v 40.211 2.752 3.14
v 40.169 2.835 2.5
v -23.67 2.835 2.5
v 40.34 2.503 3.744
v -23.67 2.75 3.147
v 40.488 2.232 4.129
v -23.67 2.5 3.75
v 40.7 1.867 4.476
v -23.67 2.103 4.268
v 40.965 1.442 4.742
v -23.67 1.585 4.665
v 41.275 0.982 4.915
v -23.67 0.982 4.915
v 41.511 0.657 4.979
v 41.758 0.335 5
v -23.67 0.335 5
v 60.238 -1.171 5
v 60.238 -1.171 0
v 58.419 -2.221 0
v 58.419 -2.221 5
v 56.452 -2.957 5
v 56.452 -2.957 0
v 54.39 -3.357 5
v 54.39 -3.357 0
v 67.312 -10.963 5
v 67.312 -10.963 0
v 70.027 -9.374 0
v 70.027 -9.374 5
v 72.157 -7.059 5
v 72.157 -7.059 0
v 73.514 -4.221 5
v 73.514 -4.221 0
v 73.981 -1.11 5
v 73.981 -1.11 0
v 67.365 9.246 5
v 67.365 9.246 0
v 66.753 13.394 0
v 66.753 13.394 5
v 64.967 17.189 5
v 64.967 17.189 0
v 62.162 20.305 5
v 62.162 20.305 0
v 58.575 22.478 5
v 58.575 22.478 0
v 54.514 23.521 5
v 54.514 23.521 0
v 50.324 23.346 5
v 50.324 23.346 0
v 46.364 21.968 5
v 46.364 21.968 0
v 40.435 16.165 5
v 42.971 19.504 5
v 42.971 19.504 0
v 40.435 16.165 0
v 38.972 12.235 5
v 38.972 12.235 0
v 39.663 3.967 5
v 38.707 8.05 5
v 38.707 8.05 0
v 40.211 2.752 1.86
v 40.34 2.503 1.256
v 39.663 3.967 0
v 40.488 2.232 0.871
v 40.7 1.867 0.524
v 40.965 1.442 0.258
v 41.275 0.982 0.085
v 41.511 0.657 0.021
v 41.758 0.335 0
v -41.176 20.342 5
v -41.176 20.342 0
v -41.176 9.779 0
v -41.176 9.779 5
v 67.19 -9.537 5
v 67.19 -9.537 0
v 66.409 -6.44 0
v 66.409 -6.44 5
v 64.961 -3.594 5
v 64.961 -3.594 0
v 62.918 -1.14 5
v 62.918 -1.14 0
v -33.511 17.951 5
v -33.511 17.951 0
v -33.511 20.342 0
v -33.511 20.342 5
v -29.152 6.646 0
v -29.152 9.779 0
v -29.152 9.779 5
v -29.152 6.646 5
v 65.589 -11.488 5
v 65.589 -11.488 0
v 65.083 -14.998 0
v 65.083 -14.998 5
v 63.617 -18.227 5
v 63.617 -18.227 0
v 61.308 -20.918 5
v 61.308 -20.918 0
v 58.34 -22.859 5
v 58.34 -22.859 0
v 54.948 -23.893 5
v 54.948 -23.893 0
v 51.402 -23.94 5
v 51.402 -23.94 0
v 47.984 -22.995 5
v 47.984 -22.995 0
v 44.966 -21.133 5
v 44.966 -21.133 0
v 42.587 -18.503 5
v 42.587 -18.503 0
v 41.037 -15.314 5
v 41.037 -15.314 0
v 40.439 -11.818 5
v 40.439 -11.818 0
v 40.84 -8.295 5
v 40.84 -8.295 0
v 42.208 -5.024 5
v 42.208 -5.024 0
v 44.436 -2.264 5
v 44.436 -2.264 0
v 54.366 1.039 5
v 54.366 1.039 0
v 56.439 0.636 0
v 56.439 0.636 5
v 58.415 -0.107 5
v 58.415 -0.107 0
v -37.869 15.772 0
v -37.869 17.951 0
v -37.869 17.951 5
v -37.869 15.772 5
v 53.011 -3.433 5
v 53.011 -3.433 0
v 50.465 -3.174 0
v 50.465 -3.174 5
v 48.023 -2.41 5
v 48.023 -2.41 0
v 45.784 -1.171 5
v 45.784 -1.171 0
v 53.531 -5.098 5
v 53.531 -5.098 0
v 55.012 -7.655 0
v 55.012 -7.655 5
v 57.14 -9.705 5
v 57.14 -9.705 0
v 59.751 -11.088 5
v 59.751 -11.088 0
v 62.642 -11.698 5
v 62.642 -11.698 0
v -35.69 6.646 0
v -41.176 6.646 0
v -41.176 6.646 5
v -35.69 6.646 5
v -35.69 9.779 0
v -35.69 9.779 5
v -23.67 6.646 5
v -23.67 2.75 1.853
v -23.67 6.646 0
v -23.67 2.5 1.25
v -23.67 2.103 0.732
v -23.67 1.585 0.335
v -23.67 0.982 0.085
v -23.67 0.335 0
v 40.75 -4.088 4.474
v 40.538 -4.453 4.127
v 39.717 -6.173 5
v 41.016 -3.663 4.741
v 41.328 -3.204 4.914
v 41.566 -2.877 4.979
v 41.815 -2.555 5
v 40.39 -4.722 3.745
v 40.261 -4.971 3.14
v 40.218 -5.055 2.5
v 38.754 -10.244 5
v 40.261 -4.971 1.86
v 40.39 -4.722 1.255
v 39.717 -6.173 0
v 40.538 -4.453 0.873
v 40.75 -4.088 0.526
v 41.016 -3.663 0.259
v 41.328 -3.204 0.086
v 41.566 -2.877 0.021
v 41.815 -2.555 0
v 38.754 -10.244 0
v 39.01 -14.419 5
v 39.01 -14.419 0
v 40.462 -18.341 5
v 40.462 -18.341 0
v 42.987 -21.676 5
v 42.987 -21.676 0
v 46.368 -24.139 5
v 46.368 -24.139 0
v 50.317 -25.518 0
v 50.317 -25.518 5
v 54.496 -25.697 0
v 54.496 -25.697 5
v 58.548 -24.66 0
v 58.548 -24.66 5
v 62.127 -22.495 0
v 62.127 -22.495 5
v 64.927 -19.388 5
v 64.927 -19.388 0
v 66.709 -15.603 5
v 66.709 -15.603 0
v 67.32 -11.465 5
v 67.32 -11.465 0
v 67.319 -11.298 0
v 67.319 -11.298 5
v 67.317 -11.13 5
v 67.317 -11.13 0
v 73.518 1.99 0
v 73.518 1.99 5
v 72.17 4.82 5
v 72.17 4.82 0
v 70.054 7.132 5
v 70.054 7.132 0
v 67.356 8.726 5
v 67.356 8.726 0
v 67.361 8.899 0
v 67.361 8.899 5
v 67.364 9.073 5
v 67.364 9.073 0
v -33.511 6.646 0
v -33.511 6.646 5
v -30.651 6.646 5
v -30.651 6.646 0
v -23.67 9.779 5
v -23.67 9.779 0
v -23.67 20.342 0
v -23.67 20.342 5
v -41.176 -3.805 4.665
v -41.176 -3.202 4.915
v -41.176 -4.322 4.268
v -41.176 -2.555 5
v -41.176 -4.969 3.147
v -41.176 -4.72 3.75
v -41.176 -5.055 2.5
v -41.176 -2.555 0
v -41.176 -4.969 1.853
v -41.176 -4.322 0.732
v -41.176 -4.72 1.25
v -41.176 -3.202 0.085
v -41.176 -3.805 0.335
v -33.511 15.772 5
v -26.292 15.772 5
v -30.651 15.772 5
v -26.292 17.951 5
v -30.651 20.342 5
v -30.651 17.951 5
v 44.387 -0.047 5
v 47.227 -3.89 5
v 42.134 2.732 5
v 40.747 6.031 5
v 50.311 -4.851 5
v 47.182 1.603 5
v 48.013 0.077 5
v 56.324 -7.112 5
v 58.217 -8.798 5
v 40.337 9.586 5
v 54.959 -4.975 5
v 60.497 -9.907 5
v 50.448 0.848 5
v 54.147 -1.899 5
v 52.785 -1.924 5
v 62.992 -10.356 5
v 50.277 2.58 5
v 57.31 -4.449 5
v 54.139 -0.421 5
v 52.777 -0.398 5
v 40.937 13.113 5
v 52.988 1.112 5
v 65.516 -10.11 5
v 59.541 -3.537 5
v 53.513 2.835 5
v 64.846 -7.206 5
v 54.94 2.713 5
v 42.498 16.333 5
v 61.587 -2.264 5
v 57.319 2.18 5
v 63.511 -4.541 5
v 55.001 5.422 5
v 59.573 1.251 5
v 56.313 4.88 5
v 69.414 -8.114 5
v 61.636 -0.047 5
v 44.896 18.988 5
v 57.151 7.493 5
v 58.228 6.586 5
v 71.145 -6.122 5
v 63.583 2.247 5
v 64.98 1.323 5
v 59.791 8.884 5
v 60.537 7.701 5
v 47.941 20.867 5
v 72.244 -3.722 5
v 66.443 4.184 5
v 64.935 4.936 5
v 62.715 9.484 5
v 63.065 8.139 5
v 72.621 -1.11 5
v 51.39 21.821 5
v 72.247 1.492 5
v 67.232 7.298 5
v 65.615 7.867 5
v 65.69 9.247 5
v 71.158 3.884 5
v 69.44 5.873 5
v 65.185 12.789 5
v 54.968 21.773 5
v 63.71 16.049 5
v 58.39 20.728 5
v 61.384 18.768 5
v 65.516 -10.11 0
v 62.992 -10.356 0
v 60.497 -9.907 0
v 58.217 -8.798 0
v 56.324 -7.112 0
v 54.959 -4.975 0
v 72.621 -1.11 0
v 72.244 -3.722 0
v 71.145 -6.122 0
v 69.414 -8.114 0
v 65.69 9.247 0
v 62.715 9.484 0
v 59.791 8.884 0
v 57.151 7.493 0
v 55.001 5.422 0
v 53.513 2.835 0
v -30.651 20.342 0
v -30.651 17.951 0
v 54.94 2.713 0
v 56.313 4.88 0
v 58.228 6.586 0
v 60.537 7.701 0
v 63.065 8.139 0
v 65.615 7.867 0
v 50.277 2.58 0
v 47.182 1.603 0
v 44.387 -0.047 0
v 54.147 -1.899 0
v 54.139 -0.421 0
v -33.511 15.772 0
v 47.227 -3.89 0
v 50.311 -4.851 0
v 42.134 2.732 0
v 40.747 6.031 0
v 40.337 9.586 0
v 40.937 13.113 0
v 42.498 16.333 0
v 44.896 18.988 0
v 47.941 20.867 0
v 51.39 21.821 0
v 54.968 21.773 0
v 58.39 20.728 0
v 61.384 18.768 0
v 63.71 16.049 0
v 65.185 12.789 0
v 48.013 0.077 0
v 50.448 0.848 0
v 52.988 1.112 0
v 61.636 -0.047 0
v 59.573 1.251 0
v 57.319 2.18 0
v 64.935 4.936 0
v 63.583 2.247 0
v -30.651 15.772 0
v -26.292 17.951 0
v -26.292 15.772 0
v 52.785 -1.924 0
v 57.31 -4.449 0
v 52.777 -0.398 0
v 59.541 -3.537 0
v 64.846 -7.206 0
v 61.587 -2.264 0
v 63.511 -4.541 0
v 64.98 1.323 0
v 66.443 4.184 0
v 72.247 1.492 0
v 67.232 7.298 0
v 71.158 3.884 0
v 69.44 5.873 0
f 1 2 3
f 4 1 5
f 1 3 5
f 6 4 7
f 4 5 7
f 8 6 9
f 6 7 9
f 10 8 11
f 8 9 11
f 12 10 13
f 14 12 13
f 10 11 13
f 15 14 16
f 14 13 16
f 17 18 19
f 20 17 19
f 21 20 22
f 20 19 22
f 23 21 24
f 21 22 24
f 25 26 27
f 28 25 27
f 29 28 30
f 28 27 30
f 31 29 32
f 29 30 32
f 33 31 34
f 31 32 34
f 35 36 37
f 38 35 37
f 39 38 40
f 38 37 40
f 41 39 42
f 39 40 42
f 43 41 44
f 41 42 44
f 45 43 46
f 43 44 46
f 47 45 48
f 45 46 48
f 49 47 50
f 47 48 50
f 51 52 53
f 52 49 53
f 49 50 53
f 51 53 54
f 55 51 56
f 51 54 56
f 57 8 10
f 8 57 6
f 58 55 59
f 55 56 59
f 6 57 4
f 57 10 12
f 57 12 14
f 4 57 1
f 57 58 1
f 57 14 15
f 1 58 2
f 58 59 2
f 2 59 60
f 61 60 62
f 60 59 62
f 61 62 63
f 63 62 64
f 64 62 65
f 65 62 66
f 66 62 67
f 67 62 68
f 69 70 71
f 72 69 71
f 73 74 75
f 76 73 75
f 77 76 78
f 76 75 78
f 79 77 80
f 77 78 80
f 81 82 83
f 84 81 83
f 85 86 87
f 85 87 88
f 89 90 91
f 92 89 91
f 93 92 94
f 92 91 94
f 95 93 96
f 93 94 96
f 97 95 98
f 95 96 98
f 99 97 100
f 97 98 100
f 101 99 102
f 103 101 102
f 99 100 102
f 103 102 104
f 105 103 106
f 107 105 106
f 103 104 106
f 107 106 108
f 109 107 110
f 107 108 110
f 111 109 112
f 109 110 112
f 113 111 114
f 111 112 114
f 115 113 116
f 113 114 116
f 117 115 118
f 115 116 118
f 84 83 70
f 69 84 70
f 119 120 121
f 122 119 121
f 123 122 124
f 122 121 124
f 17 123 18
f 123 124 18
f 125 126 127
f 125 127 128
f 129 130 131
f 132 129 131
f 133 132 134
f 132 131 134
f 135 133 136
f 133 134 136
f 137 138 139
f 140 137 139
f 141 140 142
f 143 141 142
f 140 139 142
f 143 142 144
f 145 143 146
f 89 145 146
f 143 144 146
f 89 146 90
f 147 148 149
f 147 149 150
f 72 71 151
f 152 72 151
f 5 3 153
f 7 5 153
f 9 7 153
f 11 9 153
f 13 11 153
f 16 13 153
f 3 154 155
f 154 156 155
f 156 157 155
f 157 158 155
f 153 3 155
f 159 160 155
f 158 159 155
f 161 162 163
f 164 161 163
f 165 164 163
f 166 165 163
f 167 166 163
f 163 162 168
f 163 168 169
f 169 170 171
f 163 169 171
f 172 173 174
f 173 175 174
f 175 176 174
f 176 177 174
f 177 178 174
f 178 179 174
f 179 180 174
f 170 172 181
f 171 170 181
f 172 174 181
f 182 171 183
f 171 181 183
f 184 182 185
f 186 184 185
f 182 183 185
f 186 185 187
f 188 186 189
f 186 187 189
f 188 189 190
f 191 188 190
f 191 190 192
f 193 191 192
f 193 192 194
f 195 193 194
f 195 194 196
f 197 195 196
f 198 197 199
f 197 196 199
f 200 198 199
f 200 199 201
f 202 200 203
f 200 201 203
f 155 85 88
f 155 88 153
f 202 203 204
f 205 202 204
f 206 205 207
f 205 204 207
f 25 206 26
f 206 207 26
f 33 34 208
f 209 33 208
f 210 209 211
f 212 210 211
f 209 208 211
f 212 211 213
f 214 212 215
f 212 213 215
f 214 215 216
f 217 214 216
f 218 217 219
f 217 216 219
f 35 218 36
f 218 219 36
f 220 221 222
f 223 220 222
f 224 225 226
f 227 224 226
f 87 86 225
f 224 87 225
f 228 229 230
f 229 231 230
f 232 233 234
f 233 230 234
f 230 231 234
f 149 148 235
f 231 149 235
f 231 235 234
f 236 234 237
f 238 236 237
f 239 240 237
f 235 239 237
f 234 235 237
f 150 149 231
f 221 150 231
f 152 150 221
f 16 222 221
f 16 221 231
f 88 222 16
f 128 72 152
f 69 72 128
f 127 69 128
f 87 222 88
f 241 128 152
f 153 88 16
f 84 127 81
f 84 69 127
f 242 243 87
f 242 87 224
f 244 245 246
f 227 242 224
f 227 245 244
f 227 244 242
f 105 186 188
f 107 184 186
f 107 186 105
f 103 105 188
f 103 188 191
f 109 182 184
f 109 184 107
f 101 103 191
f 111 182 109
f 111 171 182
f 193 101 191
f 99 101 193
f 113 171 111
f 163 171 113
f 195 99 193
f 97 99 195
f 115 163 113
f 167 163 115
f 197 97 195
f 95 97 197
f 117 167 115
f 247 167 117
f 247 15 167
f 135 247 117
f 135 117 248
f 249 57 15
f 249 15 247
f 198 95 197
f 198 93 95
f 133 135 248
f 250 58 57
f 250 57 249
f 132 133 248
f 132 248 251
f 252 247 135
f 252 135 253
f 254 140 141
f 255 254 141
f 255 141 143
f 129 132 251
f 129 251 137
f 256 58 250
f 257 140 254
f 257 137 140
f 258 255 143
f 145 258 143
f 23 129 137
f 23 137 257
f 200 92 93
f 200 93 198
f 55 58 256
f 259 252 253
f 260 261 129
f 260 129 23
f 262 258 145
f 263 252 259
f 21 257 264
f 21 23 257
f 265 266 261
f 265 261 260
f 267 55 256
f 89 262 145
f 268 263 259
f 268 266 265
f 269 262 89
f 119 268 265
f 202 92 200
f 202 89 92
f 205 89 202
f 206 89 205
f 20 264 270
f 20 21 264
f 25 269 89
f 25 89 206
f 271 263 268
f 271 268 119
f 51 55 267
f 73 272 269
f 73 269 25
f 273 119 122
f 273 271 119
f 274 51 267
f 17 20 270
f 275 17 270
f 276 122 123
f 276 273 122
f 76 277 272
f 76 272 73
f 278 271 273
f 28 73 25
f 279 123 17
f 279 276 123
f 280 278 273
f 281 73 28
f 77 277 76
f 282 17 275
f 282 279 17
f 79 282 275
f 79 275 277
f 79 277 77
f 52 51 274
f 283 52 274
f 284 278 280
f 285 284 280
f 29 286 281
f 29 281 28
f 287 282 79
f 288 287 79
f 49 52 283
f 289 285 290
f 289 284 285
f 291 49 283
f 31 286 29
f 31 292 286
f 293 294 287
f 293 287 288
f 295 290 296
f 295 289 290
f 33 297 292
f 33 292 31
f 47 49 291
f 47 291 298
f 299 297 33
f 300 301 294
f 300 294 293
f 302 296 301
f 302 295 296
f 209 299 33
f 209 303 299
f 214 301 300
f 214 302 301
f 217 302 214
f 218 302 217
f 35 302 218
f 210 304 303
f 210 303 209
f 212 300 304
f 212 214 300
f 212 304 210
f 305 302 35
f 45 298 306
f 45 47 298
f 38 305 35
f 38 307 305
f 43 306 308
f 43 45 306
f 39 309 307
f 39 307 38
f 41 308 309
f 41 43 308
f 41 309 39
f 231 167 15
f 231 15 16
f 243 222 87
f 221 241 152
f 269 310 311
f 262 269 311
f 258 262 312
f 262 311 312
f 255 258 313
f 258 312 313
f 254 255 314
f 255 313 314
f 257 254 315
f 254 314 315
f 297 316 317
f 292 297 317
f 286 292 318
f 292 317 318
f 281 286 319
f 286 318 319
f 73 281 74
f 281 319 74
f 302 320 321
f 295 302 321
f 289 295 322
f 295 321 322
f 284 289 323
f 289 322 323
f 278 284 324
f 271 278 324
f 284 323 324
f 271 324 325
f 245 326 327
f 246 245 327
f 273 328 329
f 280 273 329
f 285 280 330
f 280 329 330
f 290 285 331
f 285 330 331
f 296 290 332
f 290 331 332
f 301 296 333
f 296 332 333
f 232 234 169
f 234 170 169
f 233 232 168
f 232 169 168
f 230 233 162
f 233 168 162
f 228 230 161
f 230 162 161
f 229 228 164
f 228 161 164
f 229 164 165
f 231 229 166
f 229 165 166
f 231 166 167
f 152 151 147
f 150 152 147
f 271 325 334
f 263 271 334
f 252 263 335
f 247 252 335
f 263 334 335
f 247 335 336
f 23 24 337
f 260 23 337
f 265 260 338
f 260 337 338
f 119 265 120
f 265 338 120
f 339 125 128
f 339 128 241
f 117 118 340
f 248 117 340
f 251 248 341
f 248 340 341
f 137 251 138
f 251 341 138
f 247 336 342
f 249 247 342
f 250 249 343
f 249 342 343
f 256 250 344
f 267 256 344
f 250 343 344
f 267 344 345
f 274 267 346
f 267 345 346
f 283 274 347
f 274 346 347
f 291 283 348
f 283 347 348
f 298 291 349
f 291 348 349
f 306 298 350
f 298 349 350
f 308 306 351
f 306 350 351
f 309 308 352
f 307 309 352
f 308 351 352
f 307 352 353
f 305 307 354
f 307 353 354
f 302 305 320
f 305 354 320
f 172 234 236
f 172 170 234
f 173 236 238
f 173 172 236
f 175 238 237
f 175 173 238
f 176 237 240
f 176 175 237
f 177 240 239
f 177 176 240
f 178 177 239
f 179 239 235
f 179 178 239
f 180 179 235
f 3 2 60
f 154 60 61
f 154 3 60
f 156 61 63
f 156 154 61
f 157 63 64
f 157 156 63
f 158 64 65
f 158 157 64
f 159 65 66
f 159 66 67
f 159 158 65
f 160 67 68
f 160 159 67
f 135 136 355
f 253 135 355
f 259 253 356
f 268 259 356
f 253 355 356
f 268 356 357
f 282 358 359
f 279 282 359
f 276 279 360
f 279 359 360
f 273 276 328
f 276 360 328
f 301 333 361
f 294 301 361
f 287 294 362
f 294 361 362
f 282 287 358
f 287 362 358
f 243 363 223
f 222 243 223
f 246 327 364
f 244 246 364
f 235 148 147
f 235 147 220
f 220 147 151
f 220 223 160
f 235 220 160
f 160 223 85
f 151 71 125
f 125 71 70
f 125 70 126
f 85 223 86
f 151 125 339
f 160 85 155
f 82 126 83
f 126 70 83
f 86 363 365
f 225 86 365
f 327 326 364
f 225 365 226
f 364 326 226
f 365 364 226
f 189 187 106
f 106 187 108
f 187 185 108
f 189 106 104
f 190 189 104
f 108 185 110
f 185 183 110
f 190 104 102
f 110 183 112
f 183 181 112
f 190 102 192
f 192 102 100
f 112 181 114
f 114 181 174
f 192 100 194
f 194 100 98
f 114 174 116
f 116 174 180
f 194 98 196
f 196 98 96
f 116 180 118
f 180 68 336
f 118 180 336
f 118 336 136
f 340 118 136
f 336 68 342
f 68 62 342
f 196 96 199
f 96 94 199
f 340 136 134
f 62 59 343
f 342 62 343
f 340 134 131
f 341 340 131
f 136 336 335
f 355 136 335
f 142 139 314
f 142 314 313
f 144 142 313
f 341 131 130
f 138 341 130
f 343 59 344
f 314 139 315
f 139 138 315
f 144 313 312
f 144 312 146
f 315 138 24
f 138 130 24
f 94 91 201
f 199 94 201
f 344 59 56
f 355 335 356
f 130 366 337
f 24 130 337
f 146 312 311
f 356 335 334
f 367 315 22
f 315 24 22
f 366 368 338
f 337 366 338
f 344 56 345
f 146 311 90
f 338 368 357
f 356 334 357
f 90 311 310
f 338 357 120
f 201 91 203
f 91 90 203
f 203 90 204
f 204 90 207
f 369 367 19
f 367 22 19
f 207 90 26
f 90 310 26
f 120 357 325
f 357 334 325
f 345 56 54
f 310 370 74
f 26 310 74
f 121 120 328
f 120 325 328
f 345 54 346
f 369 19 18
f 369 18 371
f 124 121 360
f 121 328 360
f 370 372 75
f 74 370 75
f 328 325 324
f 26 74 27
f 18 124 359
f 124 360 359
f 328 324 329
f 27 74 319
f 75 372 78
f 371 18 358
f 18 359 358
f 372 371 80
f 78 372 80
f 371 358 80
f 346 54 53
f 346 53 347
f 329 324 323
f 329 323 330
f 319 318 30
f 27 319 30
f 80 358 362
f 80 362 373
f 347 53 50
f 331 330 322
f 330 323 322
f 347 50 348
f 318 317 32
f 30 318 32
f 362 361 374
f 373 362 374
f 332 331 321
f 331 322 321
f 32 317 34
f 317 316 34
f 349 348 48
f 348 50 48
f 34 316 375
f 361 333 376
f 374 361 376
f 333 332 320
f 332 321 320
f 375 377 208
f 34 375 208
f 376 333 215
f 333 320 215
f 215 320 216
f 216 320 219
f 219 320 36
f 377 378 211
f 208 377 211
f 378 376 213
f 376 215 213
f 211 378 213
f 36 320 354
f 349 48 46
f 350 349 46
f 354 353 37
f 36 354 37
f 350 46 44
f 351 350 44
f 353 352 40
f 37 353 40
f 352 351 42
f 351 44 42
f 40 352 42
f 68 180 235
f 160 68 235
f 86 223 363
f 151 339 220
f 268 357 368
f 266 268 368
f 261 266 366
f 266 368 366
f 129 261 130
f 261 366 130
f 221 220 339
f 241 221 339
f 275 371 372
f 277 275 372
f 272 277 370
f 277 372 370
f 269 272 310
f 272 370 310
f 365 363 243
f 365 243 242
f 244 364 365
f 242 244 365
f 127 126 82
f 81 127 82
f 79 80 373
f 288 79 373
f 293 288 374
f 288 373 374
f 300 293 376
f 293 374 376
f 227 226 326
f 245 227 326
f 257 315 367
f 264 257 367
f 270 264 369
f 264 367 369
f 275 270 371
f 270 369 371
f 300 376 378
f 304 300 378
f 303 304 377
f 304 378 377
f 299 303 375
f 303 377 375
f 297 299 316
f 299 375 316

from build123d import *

# Parameters (mm, degrees)
F1_DEPTH = 5
F2_R     = 2.49999
F3_W     = 5.486164242
F3_H     = 3.1326031312
F3_W_2   = 5.482269451
F3_W_3   = 2.8602015227
F3_H_2   = 9.1254087165
F3_H_3   = 2.179203555
F3_H_4   = 2.3905187845
F3_W_4   = 4.3584052473
F3_W_5   = 4.3584033847
F4_DEPTH = 25


# Not quite as in the source:
# - a fillet or chamfer is up to 0.001 mm smaller than in the source, because OpenCascade refuses the exact size


with BuildPart() as f1:
    # F0 (on Top) → F1 (new body)
    with BuildSketch(Plane.XY):
        with BuildLine():
            ThreePointArc((43.1041480843, -1.140358212), (41.4640780002, 0.7201286462), (40.168760519, 2.8351685639))
            Line((40.168760519, 2.8351685639), (-23.6701387912, 2.8351685639))
            Line((-23.6701387912, 2.8351685639), (-23.6701387912, 20.3415267169))
            Line((-23.6701387912, 20.3415267169), (-41.1761775613, 20.3415267169))
            Line((-41.1761775613, 20.3415267169), (-41.1761775613, 2.8351685639))
            Line((-41.1761775613, 2.8351685639), (-41.1761775613, -5.0545609556))
            Line((-41.1761775613, -5.0545609556), (40.2184031878, -5.0545609556))
            ThreePointArc((40.2184031878, -5.0545609556), (41.4937778577, -2.9739718927), (43.1041480843, -1.140358212))
        make_face()
        with BuildLine():
            ThreePointArc((67.3555774067, 8.7261943334), (67.3626426338, 8.9861285841), (67.3649979671, 9.246148169))
            ThreePointArc((67.3649979671, 9.246148169), (49.7178994981, 23.2169748342), (40.168760519, 2.8351685639))
            ThreePointArc((40.168760519, 2.8351685639), (41.4640780002, 0.7201286462), (43.1041480843, -1.140358212))
            ThreePointArc((43.1041480843, -1.140358212), (43.7292665999, -0.5749391558), (44.3865925628, -0.0473081805))
            ThreePointArc((44.3865925628, -0.0473081805), (47.9413125892, 20.8671965928), (65.6900889224, 9.2468057623))
            ThreePointArc((65.6900889224, 9.2468057623), (66.5335502723, 9.0207851567), (67.3555774067, 8.7261943334))
        make_face()
        with BuildLine():
            ThreePointArc((44.4356579567, -2.2642557619), (43.7528332621, -1.7225299618), (43.1041480843, -1.140358212))
            ThreePointArc((43.1041480843, -1.140358212), (41.4937778577, -2.9739718927), (40.2184031878, -5.0545609556))
            ThreePointArc((40.2184031878, -5.0545609556), (49.7174675435, -25.3901824255), (67.3204571559, -11.4652235061))
            ThreePointArc((67.3204571559, -11.4652235061), (67.3182526979, -11.2140597341), (67.3116400033, -10.96297335))
            ThreePointArc((67.3116400033, -10.96297335), (66.4614410979, -11.2621198468), (65.5889276735, -11.4880559652))
            ThreePointArc((65.5889276735, -11.4880559652), (47.9839421141, -22.9945229972), (44.4356579567, -2.2642557619))
        make_face()
        with BuildLine():
            ThreePointArc((73.9806472497, -1.1095376685), (72.169922865, 4.8199052741), (67.3555774067, 8.7261943334))
            ThreePointArc((67.3555774067, 8.7261943334), (67.3117311725, 8.010705268), (67.2322189831, 7.2982974448))
            ThreePointArc((67.2322189831, 7.2982974448), (71.1579723309, 3.8836422981), (72.6206968225, -1.1095376685))
            ThreePointArc((72.6206968225, -1.1095376685), (71.1453970138, -6.1222851765), (67.1899029185, -9.5366978003))
            ThreePointArc((67.1899029185, -9.5366978003), (67.2686178092, -10.2483123334), (67.3116400033, -10.96297335))
            ThreePointArc((67.3116400033, -10.96297335), (72.1566691186, -7.0586101253), (73.9806472497, -1.1095376685))
        make_face()
        with BuildLine():
            ThreePointArc((54.9590998914, -4.9748227507), (54.2466920753, -5.0543350042), (53.5312030139, -5.0981813027))
            ThreePointArc((53.5312030139, -5.0981813027), (58.3970374227, -10.4877579943), (65.5889276735, -11.4880559652))
            ThreePointArc((65.5889276735, -11.4880559652), (65.5889432165, -11.4766397403), (65.5889483975, -11.4652235061))
            ThreePointArc((65.5889483975, -11.4652235061), (65.5706384672, -10.7868000494), (65.5157619854, -10.1103518165))
            ThreePointArc((65.5157619854, -10.1103518165), (59.3188229712, -9.4308900821), (54.9590998914, -4.9748227507))
        make_face()
        with BuildLine():
            ThreePointArc((54.3661207024, 1.0392904692), (53.6782725799, 1.094777615), (52.9884165603, 1.1124562812))
            ThreePointArc((52.9884165603, 1.1124562812), (52.7533483797, -1.1613192361), (53.0105914352, -3.4326928652))
            ThreePointArc((53.0105914352, -3.4326928652), (53.7015001008, -3.4138898359), (54.3903575498, -3.3574650805))
            ThreePointArc((54.3903575498, -3.3574650805), (54.1133130855, -1.1605476943), (54.3661207024, 1.0392904692))
        make_face()
        with BuildLine():
            ThreePointArc((65.6900889395, 9.246148169), (65.6900889352, 9.2464769657), (65.6900889224, 9.2468057623))
            ThreePointArc((65.6900889224, 9.2468057623), (58.421880956, 8.2818061592), (53.5134993303, 2.8351685639))
            ThreePointArc((53.5134993303, 2.8351685639), (54.2281603431, 2.7921463054), (54.9397748692, 2.7134313507))
            ThreePointArc((54.9397748692, 2.7134313507), (59.3437953002, 7.2239168329), (65.6148612618, 7.867039641))
            ThreePointArc((65.6148612618, 7.867039641), (65.6712680509, 8.5555687863), (65.6900889395, 9.246148169))
        make_face()
        with BuildLine():
            ThreePointArc((60.2384014175, -1.1712057304), (60.9570485035, -0.6339967178), (61.6359032137, -0.0473081805))
            ThreePointArc((61.6359032137, -0.0473081805), (58.4654054664, 1.7637460297), (54.9397748692, 2.7134313507))
            ThreePointArc((54.9397748692, 2.7134313507), (54.6128353821, 1.8901056598), (54.3661207024, 1.0392904692))
            ThreePointArc((54.3661207024, 1.0392904692), (57.4423163149, 0.3061053356), (60.2384014175, -1.1712057304))
        make_face()
        with BuildLine():
            ThreePointArc((53.5134993303, 2.8351685639), (48.7018941946, 2.1796634707), (44.3865925628, -0.0473081805))
            ThreePointArc((44.3865925628, -0.0473081805), (45.0654472729, -0.6339967178), (45.7840943589, -1.1712057304))
            ThreePointArc((45.7840943589, -1.1712057304), (49.2106758058, 0.5245305343), (52.9884165603, 1.1124562812))
            ThreePointArc((52.9884165603, 1.1124562812), (53.2143527571, 1.9849696853), (53.5134993303, 2.8351685639))
        make_face()
        with BuildLine():
            ThreePointArc((44.3865925628, -0.0473081805), (43.7292665999, -0.5749391558), (43.1041480843, -1.140358212))
            ThreePointArc((43.1041480843, -1.140358212), (43.7528332621, -1.7225299618), (44.4356579567, -2.2642557619))
            ThreePointArc((44.4356579567, -2.2642557619), (45.0909975882, -1.6944412812), (45.7840943589, -1.1712057304))
            ThreePointArc((45.7840943589, -1.1712057304), (45.0654472729, -0.6339967178), (44.3865925628, -0.0473081805))
        make_face()
        with BuildLine():
            ThreePointArc((45.7840943589, -1.1712057304), (45.0909975882, -1.6944412812), (44.4356579567, -2.2642557619))
            ThreePointArc((44.4356579567, -2.2642557619), (48.7414590733, -4.4578309904), (53.5312030139, -5.0981813027))
            ThreePointArc((53.5312030139, -5.0981813027), (53.2366121166, -4.2761541948), (53.0105914352, -3.4326928652))
            ThreePointArc((53.0105914352, -3.4326928652), (49.2245751666, -2.854022082), (45.7840943589, -1.1712057304))
        make_face()
        with BuildLine():
            ThreePointArc((53.0105914352, -3.4326928652), (53.2366121166, -4.2761541948), (53.5312030139, -5.0981813027))
            ThreePointArc((53.5312030139, -5.0981813027), (54.2466920753, -5.0543350042), (54.9590998914, -4.9748227507))
            ThreePointArc((54.9590998914, -4.9748227507), (54.6371920778, -4.1793436416), (54.3903575498, -3.3574650805))
            ThreePointArc((54.3903575498, -3.3574650805), (53.7015001008, -3.4138898359), (53.0105914352, -3.4326928652))
        make_face()
        with BuildLine():
            ThreePointArc((54.9397748692, 2.7134313507), (54.2281603431, 2.7921463054), (53.5134993303, 2.8351685639))
            ThreePointArc((53.5134993303, 2.8351685639), (53.2143527571, 1.9849696853), (52.9884165603, 1.1124562812))
            ThreePointArc((52.9884165603, 1.1124562812), (53.6782725799, 1.094777615), (54.3661207024, 1.0392904692))
            ThreePointArc((54.3661207024, 1.0392904692), (54.6128353821, 1.8901056598), (54.9397748692, 2.7134313507))
        make_face()
        with BuildLine():
            ThreePointArc((54.9590998914, -4.9748227507), (58.4447091137, -4.0394696351), (61.5868378197, -2.2642557619))
            ThreePointArc((61.5868378197, -2.2642557619), (60.9314981882, -1.6944412812), (60.2384014175, -1.1712057304))
            ThreePointArc((60.2384014175, -1.1712057304), (57.4510535162, -2.6299259461), (54.3903575498, -3.3574650805))
            ThreePointArc((54.3903575498, -3.3574650805), (54.6371920778, -4.1793436416), (54.9590998914, -4.9748227507))
        make_face()
        with BuildLine():
            ThreePointArc((61.5868378197, -2.2642557619), (62.2696625143, -1.7225299618), (62.9183476921, -1.140358212))
            ThreePointArc((62.9183476921, -1.140358212), (62.2932291765, -0.5749391558), (61.6359032137, -0.0473081805))
            ThreePointArc((61.6359032137, -0.0473081805), (60.9570485035, -0.6339967178), (60.2384014175, -1.1712057304))
            ThreePointArc((60.2384014175, -1.1712057304), (60.9314981882, -1.6944412812), (61.5868378197, -2.2642557619))
        make_face()
        with BuildLine():
            ThreePointArc((62.9183476921, -1.140358212), (65.7918456304, 2.7126603808), (67.2322189831, 7.2982974448))
            ThreePointArc((67.2322189831, 7.2982974448), (66.4367398451, 7.6202051868), (65.6148612618, 7.867039641))
            ThreePointArc((65.6148612618, 7.867039641), (64.3390487935, 3.5510680946), (61.6359032137, -0.0473081805))
            ThreePointArc((61.6359032137, -0.0473081805), (62.2932291765, -0.5749391558), (62.9183476921, -1.140358212))
        make_face()
        with BuildLine():
            ThreePointArc((67.2322189831, 7.2982974448), (67.3117311725, 8.010705268), (67.3555774067, 8.7261943334))
            ThreePointArc((67.3555774067, 8.7261943334), (66.5335502723, 9.0207851567), (65.6900889224, 9.2468057623))
            ThreePointArc((65.6900889224, 9.2468057623), (65.6900889352, 9.2464769657), (65.6900889395, 9.246148169))
            ThreePointArc((65.6900889395, 9.246148169), (65.6712680509, 8.5555687863), (65.6148612618, 7.867039641))
            ThreePointArc((65.6148612618, 7.867039641), (66.4367398451, 7.6202051868), (67.2322189831, 7.2982974448))
        make_face()
        with BuildLine():
            ThreePointArc((67.1899029185, -9.5366978003), (65.7648954489, -4.9769306827), (62.9183476921, -1.140358212))
            ThreePointArc((62.9183476921, -1.140358212), (62.2696625143, -1.7225299618), (61.5868378197, -2.2642557619))
            ThreePointArc((61.5868378197, -2.2642557619), (64.2577141016, -5.8335676384), (65.5157619854, -10.1103518165))
            ThreePointArc((65.5157619854, -10.1103518165), (66.3665771981, -9.8636372133), (67.1899029185, -9.5366978003))
        make_face()
        with BuildLine():
            ThreePointArc((65.5889276735, -11.4880559652), (66.4614410979, -11.2621198468), (67.3116400033, -10.96297335))
            ThreePointArc((67.3116400033, -10.96297335), (67.2686178092, -10.2483123334), (67.1899029185, -9.5366978003))
            ThreePointArc((67.1899029185, -9.5366978003), (66.3665771981, -9.8636372133), (65.5157619854, -10.1103518165))
            ThreePointArc((65.5157619854, -10.1103518165), (65.5706384672, -10.7868000494), (65.5889483975, -11.4652235061))
            ThreePointArc((65.5889483975, -11.4652235061), (65.5889432165, -11.4766397403), (65.5889276735, -11.4880559652))
        make_face()
    extrude(amount=F1_DEPTH)

    # F2 (radius 2.5 in the source; OpenCascade refuses exactly that, so slightly less here)
    f2_edges = [f1.edges().sort_by_distance(p)[0] for p in [
        (-0.478887, -5.054561, 5),
        (-0.478887, -5.054561, 0),
        (8.249311, 2.835169, 5),
        (8.249311, 2.835169, 0),
    ]]
    fillet(f2_edges, radius=F2_R)

    # F3 (on face) → F4 (cut)
    with BuildSketch(Plane(origin=(0, 0, 0), x_dir=(1, 0, 0), z_dir=(0, 0, -1))):
        with Locations((-38.4330954403, -8.2126972266)):
            Rectangle(F3_W, F3_H)
        with Locations((-26.4112735167, -8.2126972266)):
            Rectangle(F3_W_2, F3_H)
        with Locations((-32.0807108656, -11.2091000192)):
            Rectangle(F3_W_3, F3_H_2)
        with Locations((-32.0807108656, -16.8614061549)):
            Rectangle(F3_W_3, F3_H_3)
        with Locations((-32.0807108656, -19.1462673247)):
            Rectangle(F3_W_3, F3_H_4)
        with Locations((-28.4714074805, -16.8614061549)):
            Rectangle(F3_W_4, F3_H_3)
        with Locations((-35.6900133193, -16.8614061549)):
            Rectangle(F3_W_5, F3_H_3)
    extrude(amount=-F4_DEPTH, mode=Mode.SUBTRACT)


solid = f1.part
